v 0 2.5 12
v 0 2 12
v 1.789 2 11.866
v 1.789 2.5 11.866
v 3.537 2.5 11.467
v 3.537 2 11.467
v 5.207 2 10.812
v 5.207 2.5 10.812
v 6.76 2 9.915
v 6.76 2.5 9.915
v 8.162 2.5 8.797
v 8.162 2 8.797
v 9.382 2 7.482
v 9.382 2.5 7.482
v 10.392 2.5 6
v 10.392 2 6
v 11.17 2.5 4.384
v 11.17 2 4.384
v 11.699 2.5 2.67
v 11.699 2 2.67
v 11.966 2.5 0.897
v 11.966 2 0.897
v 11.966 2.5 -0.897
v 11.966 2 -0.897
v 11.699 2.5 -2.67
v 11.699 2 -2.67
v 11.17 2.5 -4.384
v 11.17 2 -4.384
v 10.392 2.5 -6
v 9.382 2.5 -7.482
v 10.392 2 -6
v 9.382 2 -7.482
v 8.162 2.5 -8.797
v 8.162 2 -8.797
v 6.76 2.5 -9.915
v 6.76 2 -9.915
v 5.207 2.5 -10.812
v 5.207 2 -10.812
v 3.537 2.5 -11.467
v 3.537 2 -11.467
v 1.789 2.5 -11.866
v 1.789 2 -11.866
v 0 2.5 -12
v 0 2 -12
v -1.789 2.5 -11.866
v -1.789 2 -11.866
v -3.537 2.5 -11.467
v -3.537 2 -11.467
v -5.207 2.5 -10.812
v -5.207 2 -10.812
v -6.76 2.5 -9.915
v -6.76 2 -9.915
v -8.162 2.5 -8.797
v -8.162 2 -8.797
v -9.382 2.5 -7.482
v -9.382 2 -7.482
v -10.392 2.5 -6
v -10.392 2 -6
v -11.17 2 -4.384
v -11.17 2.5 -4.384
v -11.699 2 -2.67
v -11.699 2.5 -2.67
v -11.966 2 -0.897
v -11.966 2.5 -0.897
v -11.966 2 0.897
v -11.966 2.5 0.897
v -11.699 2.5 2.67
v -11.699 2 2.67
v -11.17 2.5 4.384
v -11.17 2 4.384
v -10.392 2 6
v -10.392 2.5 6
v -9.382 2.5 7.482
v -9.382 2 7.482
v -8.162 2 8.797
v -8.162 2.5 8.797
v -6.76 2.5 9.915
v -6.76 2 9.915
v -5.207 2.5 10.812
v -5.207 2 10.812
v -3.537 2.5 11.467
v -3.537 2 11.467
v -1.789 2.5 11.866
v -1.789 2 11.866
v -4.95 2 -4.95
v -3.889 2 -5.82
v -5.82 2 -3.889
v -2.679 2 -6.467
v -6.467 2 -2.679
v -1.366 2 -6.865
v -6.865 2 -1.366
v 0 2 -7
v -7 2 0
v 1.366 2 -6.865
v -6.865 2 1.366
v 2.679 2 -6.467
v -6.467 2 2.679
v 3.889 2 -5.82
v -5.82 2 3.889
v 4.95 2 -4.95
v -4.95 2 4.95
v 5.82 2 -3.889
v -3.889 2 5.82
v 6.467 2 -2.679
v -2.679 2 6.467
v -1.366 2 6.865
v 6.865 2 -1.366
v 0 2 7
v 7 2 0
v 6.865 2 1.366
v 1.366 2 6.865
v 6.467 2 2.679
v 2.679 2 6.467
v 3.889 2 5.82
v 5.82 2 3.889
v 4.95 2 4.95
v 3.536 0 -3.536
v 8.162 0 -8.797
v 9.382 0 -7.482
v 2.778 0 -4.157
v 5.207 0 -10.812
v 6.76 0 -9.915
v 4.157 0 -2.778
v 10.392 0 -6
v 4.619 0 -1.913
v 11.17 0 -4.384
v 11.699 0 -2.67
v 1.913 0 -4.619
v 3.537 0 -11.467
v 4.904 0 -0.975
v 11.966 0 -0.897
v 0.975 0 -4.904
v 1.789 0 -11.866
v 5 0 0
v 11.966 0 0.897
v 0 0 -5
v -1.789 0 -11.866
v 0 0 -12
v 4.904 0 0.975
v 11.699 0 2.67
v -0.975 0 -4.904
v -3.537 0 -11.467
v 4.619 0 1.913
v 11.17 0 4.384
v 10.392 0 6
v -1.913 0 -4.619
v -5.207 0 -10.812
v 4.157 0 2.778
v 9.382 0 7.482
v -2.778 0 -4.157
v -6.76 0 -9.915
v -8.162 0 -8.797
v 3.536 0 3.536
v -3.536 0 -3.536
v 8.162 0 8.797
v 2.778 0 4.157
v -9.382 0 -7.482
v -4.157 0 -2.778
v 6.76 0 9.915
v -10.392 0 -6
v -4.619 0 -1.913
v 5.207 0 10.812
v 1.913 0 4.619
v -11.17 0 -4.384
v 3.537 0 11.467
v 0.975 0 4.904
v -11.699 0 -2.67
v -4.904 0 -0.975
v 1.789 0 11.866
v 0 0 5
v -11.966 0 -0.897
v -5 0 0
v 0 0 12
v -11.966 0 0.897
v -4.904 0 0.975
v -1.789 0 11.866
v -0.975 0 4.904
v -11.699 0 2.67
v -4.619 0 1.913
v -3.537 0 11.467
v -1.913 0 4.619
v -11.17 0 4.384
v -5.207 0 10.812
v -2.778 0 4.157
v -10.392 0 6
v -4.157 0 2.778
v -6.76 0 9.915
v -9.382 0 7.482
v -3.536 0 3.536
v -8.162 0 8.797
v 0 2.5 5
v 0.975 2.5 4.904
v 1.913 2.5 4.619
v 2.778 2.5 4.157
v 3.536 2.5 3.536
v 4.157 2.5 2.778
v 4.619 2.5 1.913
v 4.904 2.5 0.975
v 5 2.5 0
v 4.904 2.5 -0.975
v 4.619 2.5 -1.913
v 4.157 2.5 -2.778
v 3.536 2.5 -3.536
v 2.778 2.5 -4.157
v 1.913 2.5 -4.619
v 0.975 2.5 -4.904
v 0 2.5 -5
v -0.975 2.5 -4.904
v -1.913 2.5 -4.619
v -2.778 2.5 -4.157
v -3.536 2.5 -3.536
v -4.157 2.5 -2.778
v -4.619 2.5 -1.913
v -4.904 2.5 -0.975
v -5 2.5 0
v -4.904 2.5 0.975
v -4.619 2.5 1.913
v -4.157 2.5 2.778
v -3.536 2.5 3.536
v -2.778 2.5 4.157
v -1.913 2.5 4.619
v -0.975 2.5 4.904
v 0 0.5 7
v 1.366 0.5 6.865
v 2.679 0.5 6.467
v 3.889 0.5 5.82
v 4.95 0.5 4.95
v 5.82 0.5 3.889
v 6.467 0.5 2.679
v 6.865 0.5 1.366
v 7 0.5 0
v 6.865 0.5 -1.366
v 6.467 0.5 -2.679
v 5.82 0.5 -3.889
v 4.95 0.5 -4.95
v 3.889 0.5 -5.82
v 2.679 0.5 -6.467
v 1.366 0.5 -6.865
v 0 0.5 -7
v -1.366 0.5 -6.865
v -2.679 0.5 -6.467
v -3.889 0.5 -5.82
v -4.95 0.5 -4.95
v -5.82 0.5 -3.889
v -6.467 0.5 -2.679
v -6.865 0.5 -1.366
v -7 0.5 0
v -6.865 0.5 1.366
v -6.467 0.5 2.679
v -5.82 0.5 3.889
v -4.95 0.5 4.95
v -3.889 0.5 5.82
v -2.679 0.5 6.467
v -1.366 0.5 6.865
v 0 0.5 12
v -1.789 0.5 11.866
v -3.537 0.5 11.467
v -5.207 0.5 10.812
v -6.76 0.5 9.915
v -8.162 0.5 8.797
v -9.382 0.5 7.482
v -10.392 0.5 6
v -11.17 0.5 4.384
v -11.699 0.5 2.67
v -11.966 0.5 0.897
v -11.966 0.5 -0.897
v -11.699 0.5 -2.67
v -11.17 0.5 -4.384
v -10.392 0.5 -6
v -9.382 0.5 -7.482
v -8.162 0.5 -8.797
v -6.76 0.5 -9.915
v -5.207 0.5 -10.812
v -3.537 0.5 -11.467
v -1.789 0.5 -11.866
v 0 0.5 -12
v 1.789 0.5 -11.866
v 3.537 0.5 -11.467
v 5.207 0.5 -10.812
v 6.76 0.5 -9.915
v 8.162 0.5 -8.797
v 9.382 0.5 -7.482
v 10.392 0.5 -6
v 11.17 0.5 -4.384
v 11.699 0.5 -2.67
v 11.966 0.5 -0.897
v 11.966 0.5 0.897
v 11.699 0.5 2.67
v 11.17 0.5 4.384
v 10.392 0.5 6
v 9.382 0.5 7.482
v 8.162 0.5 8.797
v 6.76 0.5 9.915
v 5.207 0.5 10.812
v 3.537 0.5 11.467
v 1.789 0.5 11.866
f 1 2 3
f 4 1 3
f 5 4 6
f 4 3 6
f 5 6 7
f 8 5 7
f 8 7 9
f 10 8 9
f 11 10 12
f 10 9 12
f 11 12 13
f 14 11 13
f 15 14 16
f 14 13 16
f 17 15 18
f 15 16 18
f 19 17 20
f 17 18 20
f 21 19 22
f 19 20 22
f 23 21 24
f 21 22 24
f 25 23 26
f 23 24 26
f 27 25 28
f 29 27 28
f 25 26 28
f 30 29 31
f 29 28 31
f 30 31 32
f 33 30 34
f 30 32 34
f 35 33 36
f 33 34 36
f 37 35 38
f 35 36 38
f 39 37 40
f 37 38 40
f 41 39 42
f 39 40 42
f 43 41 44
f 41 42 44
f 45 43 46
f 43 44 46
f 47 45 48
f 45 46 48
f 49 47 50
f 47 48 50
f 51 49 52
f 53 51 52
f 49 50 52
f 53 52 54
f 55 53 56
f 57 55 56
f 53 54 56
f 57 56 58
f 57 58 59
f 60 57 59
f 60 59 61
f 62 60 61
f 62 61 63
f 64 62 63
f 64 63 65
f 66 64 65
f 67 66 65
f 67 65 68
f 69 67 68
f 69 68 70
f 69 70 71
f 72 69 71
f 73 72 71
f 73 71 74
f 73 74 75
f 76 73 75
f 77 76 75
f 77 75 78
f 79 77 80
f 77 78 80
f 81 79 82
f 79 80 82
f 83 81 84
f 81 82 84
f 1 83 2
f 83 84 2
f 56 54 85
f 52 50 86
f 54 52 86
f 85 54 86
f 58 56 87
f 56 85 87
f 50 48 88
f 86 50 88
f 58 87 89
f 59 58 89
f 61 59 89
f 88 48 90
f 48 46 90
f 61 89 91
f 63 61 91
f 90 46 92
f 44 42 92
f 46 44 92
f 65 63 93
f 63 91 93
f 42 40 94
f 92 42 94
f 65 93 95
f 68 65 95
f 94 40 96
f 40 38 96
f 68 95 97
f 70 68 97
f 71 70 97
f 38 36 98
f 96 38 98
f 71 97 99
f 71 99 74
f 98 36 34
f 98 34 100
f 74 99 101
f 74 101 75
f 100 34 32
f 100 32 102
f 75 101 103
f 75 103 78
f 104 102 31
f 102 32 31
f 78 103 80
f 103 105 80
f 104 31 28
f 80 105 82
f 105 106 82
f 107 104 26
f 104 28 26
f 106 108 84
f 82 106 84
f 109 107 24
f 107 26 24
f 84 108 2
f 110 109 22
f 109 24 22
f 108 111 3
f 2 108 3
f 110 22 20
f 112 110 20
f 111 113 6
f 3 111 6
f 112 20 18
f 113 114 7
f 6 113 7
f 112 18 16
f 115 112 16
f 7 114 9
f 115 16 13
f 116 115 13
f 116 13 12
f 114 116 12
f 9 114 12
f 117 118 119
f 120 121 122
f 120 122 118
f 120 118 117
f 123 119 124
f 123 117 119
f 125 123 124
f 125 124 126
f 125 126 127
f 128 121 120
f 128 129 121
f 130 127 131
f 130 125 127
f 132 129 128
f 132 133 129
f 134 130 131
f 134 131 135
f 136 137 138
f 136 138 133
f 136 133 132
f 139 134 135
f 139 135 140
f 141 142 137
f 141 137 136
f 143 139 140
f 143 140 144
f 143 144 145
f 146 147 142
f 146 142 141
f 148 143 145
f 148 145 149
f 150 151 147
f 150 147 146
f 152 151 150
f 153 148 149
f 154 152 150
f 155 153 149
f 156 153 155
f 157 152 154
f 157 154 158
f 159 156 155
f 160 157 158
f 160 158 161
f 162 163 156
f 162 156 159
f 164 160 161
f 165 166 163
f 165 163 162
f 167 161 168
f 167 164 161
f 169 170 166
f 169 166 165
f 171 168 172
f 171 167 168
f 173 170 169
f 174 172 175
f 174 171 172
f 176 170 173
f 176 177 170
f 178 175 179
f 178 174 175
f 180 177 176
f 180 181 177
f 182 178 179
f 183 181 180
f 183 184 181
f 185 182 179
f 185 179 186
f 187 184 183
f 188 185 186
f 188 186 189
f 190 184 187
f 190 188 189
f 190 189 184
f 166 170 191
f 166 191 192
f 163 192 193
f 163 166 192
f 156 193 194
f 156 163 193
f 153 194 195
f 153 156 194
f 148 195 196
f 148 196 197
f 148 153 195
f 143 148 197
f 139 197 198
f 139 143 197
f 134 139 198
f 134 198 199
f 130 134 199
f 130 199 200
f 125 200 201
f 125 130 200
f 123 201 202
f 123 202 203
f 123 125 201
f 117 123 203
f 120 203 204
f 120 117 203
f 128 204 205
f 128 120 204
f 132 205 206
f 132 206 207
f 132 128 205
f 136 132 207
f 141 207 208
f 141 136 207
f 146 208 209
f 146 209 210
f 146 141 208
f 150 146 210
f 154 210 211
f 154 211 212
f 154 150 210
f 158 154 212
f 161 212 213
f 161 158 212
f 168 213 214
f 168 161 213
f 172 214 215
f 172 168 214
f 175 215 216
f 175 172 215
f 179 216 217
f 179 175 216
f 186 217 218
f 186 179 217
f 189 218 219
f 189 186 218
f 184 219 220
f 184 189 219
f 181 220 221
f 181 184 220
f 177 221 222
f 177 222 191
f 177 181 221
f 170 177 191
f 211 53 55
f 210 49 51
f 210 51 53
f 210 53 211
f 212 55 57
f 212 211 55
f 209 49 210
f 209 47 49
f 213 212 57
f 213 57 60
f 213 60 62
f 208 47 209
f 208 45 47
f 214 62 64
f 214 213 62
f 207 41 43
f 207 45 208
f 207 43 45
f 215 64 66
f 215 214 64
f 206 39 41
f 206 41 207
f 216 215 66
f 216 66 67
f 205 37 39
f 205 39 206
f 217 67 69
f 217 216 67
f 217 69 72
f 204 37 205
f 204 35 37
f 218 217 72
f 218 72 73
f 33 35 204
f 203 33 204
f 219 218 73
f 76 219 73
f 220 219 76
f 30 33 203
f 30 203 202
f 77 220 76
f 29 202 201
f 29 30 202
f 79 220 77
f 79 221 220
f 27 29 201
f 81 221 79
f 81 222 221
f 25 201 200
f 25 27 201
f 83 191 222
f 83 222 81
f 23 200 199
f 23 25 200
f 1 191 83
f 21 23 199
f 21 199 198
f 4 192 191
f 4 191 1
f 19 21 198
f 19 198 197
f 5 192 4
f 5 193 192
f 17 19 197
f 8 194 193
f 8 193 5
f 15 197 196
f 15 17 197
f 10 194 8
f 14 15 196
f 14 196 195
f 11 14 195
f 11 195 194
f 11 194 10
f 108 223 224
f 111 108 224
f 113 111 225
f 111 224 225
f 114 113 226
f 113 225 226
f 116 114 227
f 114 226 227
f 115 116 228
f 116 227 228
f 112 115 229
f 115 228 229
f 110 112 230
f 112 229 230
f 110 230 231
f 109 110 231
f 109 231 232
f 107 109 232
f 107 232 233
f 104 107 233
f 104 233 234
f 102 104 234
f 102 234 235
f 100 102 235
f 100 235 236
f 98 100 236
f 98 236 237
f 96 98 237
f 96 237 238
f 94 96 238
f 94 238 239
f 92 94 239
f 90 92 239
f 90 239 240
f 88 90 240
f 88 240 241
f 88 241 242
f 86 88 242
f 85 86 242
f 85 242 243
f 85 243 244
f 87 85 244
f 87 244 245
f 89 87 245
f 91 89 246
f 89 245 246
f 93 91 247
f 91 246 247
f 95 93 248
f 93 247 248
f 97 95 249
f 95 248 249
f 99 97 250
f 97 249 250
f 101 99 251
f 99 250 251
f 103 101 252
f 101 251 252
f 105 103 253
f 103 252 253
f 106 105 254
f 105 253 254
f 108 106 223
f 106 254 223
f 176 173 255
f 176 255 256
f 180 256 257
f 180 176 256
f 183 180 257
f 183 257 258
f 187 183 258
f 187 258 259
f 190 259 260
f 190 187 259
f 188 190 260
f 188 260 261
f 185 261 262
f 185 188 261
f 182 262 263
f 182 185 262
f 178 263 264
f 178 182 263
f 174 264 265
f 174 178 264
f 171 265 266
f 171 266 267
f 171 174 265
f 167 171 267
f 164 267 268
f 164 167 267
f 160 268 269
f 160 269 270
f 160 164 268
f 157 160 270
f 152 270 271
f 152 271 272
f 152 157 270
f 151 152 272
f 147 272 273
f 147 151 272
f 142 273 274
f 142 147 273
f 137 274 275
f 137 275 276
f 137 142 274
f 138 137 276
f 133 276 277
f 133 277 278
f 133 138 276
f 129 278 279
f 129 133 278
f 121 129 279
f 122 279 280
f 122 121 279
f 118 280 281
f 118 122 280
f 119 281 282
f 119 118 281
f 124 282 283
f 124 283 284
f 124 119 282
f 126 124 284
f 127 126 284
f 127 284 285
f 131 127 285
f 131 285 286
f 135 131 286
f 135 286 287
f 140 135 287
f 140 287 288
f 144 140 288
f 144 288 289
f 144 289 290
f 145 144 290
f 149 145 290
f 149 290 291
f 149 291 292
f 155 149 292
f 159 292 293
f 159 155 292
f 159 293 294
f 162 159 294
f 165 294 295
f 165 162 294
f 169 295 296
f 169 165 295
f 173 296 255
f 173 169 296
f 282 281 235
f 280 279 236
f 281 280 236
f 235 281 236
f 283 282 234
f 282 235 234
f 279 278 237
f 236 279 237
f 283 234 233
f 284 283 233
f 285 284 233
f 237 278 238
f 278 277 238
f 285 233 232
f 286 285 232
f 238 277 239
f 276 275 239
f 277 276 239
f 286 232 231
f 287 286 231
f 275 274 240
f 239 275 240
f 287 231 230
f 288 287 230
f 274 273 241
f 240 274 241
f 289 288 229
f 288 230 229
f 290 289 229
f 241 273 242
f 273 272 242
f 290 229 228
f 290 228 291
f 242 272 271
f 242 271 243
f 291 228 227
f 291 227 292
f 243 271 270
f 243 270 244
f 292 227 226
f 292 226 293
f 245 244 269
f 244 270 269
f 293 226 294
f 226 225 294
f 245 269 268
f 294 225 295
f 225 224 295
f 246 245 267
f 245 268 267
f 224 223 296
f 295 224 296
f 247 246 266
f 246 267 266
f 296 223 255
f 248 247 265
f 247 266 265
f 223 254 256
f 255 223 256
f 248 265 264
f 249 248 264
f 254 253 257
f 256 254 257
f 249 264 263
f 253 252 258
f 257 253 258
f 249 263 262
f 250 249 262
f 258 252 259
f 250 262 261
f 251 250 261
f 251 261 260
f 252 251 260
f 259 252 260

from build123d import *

# Parameters (mm, degrees)
SKETCH_2_R      = 7
SKETCH_2_R_2    = 5
EXTRUDE_1_DEPTH = 2.5
EXTRUDE_START   = -0.5
SKETCH_3_R      = 12
SKETCH_3_R_2    = 7
EXTRUDE_2_DEPTH = 0.5
SKETCH_4_R      = 12
SKETCH_4_R_2    = 7
EXTRUDE_3_DEPTH = 0.5


with BuildPart() as part:
    # 草圖2 → 填料-伸長1 (new body)
    with BuildSketch(Plane(origin=(0, 0, 0), x_dir=(1, 0, 0), z_dir=(0, 1, 0))):
        with Locations(Location((0, 0, 0), (0, 0, 270))):
            Circle(SKETCH_2_R)
        with Locations(Location((0, 0, 0), (0, 0, 270))):
            Circle(SKETCH_2_R_2, mode=Mode.SUBTRACT)
    extrude(amount=EXTRUDE_1_DEPTH)

    # 草圖3 → 填料-伸長2 (add)
    with BuildSketch(Plane(origin=(0, 2.5, 0), x_dir=(1, 0, 0), z_dir=(0, 1, 0)).offset(EXTRUDE_START)):
        with Locations(Location((0, 0, 0), (0, 0, 270))):
            Circle(SKETCH_3_R)
        with Locations(Location((0, 0, 0), (0, 0, 270))):
            Circle(SKETCH_3_R_2, mode=Mode.SUBTRACT)
    extrude(amount=EXTRUDE_2_DEPTH)

    # 草圖4 → 填料-伸長3 (add)
    with BuildSketch(Plane.XZ):
        with Locations(Location((0, 0, 0), (0, 0, 90))):
            Circle(SKETCH_4_R)
        with Locations(Location((0, 0, 0), (0, 0, 270))):
            Circle(SKETCH_4_R_2, mode=Mode.SUBTRACT)
    extrude(amount=-EXTRUDE_3_DEPTH)


solid = part.part
